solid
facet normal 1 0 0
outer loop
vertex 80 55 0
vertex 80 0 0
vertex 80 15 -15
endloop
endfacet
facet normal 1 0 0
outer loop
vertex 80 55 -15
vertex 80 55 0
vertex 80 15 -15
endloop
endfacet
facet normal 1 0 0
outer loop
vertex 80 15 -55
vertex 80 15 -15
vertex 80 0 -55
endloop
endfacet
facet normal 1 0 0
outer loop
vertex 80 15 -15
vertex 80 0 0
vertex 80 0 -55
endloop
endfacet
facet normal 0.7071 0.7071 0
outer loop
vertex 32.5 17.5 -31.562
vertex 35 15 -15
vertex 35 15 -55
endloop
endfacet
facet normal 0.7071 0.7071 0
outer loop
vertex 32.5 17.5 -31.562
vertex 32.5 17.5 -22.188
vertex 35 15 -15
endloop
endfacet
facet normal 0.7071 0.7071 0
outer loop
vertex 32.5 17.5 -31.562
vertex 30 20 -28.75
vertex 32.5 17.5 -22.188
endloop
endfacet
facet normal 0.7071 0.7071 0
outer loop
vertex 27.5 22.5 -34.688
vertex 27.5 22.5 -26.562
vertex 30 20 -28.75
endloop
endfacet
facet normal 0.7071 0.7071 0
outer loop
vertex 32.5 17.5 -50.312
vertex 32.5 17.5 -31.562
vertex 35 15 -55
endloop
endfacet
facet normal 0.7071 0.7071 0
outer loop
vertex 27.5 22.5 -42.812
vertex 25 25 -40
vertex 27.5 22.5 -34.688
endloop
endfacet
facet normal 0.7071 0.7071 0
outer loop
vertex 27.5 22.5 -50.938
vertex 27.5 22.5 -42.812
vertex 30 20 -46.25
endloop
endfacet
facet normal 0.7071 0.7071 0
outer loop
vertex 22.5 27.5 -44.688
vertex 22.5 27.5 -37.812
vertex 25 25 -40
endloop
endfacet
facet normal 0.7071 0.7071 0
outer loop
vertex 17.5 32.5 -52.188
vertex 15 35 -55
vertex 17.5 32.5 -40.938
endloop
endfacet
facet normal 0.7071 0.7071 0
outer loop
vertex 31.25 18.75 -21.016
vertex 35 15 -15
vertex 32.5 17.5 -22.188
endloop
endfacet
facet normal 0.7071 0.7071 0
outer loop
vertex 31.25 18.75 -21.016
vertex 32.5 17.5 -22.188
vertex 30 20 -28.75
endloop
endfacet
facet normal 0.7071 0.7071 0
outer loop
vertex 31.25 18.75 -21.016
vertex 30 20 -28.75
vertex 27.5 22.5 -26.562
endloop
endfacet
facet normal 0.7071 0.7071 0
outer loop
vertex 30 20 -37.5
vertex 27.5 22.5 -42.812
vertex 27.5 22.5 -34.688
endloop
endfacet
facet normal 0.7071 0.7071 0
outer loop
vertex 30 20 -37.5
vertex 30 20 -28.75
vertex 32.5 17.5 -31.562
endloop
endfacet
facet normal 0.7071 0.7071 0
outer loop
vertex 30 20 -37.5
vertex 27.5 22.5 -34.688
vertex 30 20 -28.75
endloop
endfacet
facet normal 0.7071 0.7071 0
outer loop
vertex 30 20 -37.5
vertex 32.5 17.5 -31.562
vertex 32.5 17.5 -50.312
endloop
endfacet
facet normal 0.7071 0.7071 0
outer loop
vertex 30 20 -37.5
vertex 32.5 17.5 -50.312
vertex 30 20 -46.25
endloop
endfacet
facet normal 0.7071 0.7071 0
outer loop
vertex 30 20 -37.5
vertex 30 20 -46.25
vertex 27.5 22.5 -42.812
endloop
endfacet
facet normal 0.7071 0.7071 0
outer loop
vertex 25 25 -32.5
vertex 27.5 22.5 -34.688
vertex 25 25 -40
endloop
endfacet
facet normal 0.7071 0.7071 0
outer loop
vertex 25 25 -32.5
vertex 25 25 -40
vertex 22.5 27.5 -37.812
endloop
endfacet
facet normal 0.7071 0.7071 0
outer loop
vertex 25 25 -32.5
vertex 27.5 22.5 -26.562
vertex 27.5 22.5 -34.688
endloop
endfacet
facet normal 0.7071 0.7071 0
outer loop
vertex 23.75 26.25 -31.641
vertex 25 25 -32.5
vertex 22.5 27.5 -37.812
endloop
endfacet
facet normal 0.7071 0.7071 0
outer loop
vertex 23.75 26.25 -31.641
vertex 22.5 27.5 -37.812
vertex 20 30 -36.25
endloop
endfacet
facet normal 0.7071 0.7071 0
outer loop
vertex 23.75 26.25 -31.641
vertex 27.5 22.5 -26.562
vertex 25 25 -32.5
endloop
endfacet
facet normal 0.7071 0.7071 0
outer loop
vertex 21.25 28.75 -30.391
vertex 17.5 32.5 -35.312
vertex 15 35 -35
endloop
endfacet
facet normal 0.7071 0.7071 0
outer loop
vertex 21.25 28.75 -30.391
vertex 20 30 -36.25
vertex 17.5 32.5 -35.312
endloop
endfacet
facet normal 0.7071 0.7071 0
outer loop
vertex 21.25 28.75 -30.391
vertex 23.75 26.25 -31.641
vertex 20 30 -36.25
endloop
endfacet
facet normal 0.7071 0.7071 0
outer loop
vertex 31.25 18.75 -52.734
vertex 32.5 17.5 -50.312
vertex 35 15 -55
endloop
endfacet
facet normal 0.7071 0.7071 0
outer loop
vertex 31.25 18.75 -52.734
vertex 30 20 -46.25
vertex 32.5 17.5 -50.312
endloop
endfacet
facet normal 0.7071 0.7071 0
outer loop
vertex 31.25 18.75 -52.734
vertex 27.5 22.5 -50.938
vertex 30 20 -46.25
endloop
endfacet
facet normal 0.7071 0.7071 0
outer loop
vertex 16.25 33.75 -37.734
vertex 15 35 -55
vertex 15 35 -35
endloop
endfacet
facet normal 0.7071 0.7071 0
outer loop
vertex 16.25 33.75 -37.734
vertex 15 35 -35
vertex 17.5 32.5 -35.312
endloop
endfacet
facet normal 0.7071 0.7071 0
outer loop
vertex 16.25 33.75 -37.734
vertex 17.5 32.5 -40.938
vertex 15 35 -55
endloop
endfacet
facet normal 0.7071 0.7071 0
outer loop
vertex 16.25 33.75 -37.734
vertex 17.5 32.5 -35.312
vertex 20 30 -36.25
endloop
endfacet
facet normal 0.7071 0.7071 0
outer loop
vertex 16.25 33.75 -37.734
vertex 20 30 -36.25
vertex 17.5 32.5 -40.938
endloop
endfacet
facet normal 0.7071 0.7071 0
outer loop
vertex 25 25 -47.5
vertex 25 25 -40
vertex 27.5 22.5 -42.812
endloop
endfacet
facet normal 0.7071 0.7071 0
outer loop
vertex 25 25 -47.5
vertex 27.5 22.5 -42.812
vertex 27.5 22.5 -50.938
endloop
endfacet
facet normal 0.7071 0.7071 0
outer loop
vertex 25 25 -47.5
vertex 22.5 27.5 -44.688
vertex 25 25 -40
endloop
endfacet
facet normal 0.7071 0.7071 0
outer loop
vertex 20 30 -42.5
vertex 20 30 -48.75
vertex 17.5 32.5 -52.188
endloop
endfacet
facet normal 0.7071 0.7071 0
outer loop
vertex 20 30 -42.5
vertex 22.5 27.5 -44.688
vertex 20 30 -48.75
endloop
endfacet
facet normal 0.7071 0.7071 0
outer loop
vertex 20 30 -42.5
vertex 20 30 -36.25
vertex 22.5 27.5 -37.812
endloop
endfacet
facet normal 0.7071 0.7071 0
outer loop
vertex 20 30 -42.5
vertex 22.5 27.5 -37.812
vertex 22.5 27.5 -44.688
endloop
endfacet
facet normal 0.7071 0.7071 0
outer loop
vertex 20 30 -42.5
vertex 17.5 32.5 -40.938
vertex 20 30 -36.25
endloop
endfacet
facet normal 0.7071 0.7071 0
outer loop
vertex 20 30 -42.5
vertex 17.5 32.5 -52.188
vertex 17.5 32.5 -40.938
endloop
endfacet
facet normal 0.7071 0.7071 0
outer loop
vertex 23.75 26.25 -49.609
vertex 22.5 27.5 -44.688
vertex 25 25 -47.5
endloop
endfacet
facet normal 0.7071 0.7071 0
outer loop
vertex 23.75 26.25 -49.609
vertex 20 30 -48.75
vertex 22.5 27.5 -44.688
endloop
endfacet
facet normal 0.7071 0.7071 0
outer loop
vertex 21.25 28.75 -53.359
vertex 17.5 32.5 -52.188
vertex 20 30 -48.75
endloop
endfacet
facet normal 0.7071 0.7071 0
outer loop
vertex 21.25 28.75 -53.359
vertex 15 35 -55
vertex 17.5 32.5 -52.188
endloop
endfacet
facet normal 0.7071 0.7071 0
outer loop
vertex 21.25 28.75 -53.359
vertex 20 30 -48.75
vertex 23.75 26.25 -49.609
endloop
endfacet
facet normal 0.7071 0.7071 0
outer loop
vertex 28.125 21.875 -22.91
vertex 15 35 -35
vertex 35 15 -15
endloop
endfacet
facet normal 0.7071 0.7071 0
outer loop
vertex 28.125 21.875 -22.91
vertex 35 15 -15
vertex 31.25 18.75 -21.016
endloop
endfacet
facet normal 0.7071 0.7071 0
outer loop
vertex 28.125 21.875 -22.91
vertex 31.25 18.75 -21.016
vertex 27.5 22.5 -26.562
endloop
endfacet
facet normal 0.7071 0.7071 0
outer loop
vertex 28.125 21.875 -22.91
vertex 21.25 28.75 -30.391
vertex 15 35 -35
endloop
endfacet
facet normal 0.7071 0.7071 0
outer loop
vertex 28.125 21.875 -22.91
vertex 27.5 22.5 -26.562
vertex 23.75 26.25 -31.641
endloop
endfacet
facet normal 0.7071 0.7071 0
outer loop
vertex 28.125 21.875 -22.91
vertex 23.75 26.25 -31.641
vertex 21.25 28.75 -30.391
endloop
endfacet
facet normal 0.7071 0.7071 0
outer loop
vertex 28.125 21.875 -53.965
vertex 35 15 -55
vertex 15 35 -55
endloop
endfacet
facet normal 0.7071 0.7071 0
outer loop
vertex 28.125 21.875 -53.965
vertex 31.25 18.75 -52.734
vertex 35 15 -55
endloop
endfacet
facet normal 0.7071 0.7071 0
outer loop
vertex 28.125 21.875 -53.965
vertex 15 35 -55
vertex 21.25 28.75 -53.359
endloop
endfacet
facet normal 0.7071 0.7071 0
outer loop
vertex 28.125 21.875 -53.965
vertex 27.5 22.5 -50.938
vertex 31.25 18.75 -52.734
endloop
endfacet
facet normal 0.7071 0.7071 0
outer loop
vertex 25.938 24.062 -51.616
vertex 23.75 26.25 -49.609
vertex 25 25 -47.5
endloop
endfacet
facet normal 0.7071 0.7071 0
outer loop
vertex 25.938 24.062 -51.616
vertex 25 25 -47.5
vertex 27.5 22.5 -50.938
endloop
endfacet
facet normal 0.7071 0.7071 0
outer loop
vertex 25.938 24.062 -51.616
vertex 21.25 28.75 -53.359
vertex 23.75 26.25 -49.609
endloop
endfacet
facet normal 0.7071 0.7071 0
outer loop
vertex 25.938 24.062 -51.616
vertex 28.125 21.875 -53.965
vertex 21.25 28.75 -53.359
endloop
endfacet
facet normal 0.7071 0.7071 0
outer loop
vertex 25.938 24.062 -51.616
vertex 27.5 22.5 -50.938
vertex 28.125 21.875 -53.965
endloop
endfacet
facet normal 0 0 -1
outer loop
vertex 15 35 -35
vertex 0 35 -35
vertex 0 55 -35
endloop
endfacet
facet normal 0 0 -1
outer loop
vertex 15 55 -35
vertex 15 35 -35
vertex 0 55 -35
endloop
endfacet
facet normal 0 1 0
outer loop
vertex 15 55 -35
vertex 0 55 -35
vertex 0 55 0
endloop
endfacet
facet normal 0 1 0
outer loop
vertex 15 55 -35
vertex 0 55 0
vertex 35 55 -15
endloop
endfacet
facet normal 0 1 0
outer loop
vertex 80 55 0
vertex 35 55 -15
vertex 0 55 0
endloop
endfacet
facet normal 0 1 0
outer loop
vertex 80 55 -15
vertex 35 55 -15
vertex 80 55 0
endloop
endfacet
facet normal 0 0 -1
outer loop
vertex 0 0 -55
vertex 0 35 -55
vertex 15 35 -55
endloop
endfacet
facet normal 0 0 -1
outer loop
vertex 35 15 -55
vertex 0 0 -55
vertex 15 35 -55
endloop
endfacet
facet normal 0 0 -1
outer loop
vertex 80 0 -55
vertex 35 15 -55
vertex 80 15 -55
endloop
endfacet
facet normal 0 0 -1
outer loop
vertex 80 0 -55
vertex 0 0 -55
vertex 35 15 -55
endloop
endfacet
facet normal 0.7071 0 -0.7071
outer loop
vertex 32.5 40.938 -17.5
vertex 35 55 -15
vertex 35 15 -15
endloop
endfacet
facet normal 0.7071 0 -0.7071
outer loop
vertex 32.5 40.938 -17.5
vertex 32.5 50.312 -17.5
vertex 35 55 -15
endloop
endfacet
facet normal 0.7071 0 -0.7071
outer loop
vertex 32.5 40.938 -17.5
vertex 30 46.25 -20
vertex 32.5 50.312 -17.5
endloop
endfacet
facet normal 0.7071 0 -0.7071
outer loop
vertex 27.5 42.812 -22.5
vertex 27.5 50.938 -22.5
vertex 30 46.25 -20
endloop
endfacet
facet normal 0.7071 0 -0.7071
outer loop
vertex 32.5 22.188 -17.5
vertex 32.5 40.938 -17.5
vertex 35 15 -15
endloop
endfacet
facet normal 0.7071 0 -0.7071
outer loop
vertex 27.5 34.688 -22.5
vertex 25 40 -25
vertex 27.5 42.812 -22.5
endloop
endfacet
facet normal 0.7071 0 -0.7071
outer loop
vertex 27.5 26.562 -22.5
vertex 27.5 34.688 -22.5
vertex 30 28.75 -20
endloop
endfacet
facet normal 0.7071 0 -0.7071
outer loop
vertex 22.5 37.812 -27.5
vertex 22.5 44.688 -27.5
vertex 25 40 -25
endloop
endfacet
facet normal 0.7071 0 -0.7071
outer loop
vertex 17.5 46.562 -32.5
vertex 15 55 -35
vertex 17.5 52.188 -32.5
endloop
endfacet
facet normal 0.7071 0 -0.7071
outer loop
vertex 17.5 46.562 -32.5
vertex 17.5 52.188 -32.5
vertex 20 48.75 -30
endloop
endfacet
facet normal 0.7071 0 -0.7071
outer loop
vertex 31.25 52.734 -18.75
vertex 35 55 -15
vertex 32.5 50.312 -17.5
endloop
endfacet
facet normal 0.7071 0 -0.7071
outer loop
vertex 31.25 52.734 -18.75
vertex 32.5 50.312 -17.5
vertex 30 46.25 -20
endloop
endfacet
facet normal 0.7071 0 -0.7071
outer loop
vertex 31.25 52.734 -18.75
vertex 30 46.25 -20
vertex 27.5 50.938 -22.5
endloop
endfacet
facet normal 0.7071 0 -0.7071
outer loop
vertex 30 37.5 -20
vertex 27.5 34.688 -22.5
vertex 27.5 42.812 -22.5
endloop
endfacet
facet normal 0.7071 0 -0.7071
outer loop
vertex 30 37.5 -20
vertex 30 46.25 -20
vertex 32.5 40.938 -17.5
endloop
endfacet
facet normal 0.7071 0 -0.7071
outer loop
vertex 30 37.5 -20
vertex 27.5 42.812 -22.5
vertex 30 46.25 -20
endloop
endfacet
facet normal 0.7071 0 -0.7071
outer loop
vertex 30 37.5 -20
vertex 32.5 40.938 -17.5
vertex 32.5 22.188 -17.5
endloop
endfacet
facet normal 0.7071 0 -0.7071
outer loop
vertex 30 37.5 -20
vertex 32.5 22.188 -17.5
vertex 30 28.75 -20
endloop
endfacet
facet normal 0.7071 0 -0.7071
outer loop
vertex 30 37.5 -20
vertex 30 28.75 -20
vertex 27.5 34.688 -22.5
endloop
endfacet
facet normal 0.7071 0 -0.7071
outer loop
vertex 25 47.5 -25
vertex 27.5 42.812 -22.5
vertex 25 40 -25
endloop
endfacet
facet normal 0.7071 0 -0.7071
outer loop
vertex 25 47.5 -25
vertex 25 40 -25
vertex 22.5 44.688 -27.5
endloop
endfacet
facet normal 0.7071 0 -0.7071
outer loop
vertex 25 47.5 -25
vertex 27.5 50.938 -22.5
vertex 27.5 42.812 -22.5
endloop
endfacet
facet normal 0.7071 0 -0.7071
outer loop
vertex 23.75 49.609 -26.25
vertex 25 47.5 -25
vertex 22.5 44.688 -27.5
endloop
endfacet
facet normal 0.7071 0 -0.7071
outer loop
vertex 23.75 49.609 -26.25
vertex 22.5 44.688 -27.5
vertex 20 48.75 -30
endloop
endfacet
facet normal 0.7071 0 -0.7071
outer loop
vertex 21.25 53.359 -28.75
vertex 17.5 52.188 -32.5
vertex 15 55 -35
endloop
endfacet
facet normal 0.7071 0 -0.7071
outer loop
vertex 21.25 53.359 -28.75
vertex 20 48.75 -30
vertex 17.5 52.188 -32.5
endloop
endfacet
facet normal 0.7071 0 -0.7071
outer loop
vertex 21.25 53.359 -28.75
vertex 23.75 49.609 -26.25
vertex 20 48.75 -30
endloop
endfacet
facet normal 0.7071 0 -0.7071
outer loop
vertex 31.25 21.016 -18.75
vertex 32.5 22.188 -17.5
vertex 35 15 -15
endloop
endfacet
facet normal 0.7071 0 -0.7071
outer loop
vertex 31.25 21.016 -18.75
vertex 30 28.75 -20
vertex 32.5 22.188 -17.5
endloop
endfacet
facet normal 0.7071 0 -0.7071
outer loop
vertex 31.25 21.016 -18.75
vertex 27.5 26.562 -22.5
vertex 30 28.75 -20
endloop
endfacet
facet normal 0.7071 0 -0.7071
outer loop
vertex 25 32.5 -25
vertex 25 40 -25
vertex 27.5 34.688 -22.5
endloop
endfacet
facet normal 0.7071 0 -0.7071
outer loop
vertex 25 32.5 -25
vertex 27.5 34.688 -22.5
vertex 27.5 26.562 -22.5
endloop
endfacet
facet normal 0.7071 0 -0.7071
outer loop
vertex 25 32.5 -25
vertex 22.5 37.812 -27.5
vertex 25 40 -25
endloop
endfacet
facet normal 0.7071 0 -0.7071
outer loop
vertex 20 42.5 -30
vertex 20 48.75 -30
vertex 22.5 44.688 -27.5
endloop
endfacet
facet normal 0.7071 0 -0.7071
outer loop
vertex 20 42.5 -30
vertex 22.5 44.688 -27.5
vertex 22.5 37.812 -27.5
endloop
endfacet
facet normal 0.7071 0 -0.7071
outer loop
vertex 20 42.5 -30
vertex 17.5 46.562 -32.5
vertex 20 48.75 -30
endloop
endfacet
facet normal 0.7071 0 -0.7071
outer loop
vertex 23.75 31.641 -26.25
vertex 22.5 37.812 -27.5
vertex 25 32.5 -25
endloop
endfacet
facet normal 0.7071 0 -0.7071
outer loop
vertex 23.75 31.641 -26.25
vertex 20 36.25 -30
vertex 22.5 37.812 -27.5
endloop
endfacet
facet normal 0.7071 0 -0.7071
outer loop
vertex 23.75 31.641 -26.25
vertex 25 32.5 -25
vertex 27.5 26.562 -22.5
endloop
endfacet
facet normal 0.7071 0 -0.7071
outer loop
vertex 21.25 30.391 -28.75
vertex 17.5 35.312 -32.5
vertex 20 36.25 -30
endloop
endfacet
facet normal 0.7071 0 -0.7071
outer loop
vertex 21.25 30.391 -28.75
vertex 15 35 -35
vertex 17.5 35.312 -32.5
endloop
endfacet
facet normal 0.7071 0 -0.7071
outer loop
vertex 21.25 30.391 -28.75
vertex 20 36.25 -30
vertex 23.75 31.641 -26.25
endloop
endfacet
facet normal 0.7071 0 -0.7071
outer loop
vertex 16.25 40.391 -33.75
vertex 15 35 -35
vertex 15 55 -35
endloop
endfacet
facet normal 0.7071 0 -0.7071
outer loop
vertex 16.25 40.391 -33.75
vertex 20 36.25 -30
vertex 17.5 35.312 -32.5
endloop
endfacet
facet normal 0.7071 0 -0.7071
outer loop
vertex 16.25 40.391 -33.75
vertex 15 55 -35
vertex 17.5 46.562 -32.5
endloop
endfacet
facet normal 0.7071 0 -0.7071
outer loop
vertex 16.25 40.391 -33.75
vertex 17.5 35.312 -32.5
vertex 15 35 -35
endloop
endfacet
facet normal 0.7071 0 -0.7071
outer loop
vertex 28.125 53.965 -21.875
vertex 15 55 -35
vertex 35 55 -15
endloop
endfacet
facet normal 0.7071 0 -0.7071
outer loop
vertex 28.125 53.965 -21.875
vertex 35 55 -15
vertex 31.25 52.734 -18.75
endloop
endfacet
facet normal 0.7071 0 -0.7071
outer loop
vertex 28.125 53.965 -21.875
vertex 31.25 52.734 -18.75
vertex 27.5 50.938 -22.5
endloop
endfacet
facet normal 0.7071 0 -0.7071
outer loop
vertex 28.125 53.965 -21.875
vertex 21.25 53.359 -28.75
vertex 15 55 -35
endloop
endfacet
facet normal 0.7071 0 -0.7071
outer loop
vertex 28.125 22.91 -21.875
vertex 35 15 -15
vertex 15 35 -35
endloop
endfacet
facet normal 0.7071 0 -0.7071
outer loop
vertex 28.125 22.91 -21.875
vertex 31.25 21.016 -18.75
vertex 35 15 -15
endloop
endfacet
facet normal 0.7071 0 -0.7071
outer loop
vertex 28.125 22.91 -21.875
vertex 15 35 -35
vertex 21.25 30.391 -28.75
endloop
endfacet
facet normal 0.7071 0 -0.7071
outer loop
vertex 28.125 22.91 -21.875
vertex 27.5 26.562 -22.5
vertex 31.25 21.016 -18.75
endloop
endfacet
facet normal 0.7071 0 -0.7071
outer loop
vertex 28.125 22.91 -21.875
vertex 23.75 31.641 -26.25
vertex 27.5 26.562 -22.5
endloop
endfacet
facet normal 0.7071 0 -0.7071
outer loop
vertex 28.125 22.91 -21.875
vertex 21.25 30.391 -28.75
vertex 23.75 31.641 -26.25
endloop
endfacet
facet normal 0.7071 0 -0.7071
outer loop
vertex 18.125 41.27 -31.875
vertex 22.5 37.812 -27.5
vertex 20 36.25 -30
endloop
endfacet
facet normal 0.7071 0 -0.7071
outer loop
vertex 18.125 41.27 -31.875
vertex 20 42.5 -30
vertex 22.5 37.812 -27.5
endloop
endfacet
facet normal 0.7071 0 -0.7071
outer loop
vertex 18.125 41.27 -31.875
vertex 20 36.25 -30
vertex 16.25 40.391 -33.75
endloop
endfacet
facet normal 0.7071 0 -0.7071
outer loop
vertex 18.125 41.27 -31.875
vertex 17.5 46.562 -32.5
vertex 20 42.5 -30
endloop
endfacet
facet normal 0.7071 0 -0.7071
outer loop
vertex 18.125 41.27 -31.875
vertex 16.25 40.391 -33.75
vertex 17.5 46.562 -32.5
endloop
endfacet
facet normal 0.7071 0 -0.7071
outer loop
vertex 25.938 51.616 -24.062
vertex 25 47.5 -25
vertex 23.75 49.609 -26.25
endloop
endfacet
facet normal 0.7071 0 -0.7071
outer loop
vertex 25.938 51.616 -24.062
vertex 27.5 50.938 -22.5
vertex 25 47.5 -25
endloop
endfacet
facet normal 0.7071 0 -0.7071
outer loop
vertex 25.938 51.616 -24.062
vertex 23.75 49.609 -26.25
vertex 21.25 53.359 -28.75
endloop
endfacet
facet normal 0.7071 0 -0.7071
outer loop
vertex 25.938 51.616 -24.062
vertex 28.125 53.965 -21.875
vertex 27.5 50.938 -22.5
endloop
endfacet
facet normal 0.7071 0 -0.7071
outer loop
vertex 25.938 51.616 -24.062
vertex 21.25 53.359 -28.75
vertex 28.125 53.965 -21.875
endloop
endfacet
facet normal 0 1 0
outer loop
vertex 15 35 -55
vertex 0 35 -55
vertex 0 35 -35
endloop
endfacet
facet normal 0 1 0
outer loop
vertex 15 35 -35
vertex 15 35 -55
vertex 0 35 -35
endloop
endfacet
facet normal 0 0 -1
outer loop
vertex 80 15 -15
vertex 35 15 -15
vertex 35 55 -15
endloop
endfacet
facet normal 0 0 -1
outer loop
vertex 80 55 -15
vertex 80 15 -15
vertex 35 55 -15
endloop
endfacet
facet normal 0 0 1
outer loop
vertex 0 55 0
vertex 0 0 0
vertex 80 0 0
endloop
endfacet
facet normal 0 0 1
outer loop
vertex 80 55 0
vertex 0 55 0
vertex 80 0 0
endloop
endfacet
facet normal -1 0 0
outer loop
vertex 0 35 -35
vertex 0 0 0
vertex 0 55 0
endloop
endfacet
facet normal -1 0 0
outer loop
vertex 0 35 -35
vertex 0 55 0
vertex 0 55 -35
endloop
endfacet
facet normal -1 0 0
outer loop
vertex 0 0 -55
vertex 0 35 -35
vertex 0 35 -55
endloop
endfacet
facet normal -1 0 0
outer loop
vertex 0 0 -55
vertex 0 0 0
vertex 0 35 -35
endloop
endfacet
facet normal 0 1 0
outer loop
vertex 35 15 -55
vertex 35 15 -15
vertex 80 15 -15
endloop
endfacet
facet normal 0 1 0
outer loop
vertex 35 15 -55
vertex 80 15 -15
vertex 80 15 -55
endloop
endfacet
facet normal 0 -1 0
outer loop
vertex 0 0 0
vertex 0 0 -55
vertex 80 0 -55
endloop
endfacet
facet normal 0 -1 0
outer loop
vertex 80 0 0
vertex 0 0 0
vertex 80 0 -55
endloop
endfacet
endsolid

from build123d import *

# Parameters (mm, degrees)
SKETCH_3_W          = 80
SKETCH_3_H          = 55
EXTRUDE_2_DEPTH     = 55
SKETCH_4_W          = 40
SKETCH_4_H          = 40
CUT_EXTRUDE_2_DEPTH = 45
SKETCH_5_W          = 20
SKETCH_5_H          = 20
CUT_EXTRUDE_5_DEPTH = 15


with BuildPart() as part:
    # 草图3 → 凸台-拉伸2 (new body)
    with BuildSketch(Plane(origin=(0, 0, 0), x_dir=(1, 0, 0), z_dir=(0, 1, 0))):
        with Locations((40, 27.5)):
            Rectangle(SKETCH_3_W, SKETCH_3_H)
    extrude(amount=EXTRUDE_2_DEPTH)

    # 草图4 → 切除-拉伸2 (cut)
    with BuildSketch(Plane(origin=(80, 0, 0), x_dir=(0, 0, -1), z_dir=(1, 0, 0))):
        with Locations((35, 35)):
            Rectangle(SKETCH_4_W, SKETCH_4_H)
    extrude(amount=-CUT_EXTRUDE_2_DEPTH, mode=Mode.SUBTRACT)

    # 草图5 → 切除-拉伸5 (cut)
    with BuildSketch(Plane.ZY):
        with Locations((-45, 45)):
            Rectangle(SKETCH_5_W, SKETCH_5_H)
    extrude(amount=-CUT_EXTRUDE_5_DEPTH, mode=Mode.SUBTRACT)

    # loft from a face of the part (loft_11)
    loft([part.faces().sort_by_distance((35, 35, -35))[0], part.faces().sort_by_distance((15, 45, -45))[0]], mode=Mode.SUBTRACT)


solid = part.part
